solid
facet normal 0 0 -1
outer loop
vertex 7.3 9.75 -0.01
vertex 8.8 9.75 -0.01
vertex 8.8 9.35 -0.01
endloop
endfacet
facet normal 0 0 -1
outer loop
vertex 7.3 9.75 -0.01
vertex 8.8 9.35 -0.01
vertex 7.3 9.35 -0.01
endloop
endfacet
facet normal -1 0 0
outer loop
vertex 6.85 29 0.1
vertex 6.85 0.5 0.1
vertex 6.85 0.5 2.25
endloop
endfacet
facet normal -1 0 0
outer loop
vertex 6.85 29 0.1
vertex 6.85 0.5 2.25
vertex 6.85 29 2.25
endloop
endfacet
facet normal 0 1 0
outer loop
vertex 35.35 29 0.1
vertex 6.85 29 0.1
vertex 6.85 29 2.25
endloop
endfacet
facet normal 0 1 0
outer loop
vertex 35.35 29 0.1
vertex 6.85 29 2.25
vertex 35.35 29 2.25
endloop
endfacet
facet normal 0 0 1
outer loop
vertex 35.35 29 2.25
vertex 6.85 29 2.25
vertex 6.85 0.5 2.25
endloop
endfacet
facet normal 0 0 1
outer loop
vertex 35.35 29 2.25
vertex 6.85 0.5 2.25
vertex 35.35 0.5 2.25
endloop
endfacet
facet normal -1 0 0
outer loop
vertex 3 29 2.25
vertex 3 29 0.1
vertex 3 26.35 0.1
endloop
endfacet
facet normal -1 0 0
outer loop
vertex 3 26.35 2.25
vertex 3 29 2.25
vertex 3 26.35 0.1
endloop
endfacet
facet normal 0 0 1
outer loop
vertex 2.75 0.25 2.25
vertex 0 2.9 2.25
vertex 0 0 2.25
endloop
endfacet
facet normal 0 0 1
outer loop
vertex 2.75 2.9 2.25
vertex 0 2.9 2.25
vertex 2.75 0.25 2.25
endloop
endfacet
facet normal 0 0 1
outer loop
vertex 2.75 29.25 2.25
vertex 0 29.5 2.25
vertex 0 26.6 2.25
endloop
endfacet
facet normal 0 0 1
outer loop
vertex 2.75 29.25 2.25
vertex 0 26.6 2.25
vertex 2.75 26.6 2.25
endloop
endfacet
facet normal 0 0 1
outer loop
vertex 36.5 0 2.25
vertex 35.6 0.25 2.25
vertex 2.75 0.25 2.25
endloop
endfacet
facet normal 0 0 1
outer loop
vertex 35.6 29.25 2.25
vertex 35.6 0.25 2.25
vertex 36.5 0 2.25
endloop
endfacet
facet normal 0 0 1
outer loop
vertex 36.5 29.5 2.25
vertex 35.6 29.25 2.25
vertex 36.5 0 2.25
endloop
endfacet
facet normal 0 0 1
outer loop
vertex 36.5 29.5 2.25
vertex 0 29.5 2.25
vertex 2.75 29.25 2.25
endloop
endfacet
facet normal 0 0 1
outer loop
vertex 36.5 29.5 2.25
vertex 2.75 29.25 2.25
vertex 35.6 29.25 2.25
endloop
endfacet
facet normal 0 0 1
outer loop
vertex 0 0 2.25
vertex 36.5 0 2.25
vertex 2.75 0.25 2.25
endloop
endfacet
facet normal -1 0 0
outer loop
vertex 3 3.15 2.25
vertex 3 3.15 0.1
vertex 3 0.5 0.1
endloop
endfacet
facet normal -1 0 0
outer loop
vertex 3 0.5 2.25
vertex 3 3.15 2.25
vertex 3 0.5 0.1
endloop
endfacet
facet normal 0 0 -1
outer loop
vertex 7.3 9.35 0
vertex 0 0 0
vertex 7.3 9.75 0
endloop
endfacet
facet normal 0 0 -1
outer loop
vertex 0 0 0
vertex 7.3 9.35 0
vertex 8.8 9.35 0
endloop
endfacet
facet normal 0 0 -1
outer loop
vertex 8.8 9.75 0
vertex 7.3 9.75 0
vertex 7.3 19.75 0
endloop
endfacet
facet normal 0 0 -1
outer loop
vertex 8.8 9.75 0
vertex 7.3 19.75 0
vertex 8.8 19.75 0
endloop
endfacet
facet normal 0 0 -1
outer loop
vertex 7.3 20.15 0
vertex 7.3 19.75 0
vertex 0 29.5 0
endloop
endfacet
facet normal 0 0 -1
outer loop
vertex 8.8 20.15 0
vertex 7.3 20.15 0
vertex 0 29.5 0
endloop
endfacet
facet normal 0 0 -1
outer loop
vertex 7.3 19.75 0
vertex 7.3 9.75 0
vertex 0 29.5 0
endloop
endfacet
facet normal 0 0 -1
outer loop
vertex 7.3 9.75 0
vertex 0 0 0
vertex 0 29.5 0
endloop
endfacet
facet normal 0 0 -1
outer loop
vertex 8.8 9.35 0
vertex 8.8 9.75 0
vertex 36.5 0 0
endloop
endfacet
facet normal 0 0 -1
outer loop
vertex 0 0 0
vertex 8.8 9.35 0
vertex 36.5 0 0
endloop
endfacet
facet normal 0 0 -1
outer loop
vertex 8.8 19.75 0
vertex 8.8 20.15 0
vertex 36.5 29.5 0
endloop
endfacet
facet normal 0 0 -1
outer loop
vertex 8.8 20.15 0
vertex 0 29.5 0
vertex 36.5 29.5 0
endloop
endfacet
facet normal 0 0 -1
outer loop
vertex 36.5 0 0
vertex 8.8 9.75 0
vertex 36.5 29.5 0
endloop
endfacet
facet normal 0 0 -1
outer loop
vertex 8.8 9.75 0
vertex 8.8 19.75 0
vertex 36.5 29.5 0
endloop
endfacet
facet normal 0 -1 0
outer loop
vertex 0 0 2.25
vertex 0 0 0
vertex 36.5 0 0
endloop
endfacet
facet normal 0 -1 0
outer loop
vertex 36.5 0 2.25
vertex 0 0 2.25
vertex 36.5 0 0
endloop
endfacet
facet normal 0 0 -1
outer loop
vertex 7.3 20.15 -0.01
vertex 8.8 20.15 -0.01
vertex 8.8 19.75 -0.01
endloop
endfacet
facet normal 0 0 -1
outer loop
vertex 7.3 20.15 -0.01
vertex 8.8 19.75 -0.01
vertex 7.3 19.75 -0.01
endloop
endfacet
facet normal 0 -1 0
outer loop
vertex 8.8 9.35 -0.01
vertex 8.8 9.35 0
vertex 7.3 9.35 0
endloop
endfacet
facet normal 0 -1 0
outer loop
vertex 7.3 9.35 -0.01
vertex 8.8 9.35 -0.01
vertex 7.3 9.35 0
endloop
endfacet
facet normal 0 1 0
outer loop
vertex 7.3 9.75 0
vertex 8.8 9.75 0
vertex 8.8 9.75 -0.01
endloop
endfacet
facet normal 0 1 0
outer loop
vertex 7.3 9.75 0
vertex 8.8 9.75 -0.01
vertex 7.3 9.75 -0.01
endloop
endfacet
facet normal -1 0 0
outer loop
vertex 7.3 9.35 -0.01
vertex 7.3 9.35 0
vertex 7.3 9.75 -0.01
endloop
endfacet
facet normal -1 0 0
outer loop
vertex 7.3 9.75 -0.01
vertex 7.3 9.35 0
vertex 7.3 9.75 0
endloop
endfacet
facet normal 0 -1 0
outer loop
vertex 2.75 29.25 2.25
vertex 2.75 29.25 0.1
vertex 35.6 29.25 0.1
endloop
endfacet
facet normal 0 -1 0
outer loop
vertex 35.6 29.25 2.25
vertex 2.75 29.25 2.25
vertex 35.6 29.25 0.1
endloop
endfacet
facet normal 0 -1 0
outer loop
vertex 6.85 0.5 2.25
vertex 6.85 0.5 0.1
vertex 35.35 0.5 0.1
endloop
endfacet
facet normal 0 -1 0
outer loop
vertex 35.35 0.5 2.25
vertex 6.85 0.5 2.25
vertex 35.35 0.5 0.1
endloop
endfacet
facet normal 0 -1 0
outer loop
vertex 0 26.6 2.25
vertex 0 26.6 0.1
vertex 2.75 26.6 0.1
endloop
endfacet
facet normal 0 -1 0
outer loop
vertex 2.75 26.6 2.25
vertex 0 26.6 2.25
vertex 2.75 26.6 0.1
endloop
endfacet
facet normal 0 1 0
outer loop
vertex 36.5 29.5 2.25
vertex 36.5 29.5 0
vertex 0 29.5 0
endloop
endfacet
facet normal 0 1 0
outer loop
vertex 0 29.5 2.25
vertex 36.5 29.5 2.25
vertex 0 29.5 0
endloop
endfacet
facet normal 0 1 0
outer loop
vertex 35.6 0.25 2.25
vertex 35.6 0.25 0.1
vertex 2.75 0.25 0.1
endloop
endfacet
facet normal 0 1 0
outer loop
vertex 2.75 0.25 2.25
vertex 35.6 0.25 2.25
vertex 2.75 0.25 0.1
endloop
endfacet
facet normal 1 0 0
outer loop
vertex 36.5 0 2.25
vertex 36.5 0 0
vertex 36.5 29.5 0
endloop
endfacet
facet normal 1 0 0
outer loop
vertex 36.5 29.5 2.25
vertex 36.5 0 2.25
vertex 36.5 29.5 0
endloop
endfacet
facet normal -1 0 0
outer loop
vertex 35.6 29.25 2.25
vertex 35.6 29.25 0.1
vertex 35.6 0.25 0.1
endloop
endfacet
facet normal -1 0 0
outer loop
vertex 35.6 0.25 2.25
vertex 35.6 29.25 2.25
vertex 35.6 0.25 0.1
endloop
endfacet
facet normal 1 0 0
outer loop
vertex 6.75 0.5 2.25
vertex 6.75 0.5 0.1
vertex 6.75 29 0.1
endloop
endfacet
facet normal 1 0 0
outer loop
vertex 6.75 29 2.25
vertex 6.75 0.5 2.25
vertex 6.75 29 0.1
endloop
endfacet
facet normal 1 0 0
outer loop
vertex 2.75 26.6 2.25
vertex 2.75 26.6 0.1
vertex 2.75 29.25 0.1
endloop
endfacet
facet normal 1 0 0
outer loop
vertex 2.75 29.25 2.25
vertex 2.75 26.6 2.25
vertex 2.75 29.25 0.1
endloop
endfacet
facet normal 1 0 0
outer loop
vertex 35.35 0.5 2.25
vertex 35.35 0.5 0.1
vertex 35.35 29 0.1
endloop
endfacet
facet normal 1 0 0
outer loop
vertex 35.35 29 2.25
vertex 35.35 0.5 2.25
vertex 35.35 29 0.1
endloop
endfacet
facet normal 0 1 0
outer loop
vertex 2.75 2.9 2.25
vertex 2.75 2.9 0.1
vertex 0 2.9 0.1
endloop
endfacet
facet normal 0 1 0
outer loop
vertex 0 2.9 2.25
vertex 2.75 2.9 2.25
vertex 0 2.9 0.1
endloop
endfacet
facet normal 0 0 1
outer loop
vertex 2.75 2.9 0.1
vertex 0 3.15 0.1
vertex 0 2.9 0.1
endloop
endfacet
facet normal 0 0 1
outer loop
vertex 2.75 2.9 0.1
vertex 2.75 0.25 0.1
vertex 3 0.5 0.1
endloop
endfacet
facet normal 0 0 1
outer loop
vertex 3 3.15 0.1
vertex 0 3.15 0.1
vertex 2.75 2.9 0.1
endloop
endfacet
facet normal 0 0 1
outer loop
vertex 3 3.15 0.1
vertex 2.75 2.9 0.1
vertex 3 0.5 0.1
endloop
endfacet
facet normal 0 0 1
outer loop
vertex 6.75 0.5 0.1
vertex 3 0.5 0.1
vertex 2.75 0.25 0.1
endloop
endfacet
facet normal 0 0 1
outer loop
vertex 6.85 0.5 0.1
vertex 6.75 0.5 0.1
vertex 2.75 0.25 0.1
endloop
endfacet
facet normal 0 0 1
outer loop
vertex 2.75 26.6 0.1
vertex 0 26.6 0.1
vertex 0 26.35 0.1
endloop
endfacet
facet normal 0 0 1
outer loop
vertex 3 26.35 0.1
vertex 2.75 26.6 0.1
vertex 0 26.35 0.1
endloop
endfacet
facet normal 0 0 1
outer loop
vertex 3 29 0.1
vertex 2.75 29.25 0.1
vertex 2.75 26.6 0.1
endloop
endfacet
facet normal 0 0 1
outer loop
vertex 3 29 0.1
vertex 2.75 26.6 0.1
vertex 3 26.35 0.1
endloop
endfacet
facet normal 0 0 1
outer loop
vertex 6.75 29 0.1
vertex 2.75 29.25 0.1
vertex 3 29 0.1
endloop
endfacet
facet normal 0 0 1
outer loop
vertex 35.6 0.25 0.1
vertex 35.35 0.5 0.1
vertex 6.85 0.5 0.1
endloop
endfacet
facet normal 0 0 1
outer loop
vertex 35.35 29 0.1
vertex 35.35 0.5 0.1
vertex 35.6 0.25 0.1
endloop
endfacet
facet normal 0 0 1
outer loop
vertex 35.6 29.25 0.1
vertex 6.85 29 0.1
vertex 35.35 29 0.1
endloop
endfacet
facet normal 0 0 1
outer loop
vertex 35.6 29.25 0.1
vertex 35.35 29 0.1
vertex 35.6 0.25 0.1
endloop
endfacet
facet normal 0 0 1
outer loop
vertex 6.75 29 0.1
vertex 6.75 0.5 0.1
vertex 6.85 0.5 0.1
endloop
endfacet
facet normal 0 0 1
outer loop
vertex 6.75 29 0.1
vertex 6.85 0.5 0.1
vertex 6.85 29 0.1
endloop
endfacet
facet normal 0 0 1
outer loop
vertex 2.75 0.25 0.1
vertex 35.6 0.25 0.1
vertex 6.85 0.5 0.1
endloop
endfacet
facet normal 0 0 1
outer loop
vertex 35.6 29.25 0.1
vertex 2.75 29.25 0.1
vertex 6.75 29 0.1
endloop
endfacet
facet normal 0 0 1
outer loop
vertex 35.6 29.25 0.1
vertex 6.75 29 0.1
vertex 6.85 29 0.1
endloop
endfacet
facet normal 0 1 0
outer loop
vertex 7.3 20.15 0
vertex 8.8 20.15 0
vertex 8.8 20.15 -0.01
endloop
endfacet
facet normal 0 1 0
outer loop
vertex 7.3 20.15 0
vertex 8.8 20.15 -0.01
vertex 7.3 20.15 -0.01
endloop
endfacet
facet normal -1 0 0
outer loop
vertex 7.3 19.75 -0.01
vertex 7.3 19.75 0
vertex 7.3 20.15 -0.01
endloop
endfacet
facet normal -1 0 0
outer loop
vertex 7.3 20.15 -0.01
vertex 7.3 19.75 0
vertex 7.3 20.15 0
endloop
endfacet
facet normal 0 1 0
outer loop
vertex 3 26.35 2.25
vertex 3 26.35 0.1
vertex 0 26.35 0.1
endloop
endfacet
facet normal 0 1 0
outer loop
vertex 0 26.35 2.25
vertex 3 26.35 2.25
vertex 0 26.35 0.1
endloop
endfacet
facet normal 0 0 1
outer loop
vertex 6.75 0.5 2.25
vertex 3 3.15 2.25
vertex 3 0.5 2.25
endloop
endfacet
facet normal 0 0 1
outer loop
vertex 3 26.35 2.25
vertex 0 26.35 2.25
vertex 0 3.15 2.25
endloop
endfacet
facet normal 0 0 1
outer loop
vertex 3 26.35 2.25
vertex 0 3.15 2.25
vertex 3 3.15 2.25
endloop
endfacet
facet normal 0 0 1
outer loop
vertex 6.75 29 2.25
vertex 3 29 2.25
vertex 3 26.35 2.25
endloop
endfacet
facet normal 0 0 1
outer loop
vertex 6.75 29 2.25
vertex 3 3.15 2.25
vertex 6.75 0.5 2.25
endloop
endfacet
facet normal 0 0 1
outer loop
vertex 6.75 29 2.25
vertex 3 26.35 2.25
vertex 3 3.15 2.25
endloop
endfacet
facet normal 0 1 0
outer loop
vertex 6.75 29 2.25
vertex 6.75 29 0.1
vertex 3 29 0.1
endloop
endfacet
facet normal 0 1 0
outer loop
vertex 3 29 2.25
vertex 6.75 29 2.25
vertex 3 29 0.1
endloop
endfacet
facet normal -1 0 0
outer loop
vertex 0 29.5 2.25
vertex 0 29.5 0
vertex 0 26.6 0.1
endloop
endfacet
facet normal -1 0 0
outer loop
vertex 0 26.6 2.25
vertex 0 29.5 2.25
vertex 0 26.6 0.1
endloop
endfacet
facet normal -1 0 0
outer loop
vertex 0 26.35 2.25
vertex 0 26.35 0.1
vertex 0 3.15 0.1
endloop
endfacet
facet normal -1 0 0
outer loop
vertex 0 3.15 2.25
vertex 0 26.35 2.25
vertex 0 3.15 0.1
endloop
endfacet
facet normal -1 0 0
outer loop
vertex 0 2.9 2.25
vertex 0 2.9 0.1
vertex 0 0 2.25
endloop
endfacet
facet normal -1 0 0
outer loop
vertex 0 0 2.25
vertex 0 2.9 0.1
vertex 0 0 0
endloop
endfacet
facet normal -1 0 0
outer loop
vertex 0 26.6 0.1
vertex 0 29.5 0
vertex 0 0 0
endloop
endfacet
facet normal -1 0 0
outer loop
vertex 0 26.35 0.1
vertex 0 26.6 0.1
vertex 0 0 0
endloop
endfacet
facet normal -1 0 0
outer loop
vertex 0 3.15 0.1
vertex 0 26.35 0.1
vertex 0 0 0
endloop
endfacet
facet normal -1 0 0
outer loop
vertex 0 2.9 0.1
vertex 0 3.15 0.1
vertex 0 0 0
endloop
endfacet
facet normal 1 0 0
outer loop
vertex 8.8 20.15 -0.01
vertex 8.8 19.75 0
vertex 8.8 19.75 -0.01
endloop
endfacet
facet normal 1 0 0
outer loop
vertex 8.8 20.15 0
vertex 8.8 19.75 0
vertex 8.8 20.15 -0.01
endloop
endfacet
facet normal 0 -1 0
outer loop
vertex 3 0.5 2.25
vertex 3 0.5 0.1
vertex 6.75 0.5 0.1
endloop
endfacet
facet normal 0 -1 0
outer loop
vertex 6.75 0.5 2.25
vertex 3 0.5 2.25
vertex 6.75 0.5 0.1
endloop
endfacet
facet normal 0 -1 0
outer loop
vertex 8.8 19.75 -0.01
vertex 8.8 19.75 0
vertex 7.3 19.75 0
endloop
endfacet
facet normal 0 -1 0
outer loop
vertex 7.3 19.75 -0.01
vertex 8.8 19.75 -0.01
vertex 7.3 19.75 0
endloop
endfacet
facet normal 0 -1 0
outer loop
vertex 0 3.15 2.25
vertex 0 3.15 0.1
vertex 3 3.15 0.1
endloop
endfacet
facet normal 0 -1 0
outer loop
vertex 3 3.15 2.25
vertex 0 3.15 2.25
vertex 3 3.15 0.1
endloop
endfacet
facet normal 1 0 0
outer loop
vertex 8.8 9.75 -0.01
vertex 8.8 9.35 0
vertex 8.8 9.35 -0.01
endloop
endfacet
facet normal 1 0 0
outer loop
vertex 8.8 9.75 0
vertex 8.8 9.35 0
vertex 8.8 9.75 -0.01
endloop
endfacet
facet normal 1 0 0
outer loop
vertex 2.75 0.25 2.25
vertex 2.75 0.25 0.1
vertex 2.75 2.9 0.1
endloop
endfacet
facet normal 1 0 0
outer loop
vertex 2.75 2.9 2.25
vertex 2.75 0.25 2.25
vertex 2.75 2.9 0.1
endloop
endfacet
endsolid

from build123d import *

# Parameters (mm, degrees)
EXTRUDE_938_DEPTH  = 2.25
EXTRUDE_987_DEPTH  = 0.1
SKETCH_1488_W      = 28.5
SKETCH_1488_H      = 28.5
EXTRUDE_2115_DEPTH = 2.15
SKETCH_2253_W      = 1.5
SKETCH_2253_H      = 0.4
EXTRUDE_2914_DEPTH = 0.01


with BuildPart() as part:
    # Sketch 282 → Extrude 938 (new body)
    with BuildSketch(Plane.XY):
        Polygon((36.5, 29.5), (0, 29.5), (0, 26.6), (2.75, 26.6), (2.75, 29.25), (35.6, 29.25), (35.6, 0.25), (2.75, 0.25), (2.75, 2.9), (0, 2.9), (0, 0), (36.5, 0), align=None)
    extrude(amount=EXTRUDE_938_DEPTH)

    # 底面草图<3> → Extrude 987 (add)
    with BuildSketch(Plane.XY):
        Polygon((2.75, 26.6), (0, 26.6), (0, 2.9), (2.75, 2.9), (2.75, 0.25), (35.6, 0.25), (35.6, 29.25), (2.75, 29.25), align=None)
    extrude(amount=EXTRUDE_987_DEPTH)

    # Sketch 1488 → Extrude 2115 (add)
    with BuildSketch(Plane.XY.offset(0.1)):
        with Locations((21.1, 14.75)):
            Rectangle(SKETCH_1488_W, SKETCH_1488_H)
        Polygon((6.75, 0.5), (6.75, 29), (3, 29), (3, 26.35), (0, 26.35), (0, 3.15), (3, 3.15), (3, 0.5), align=None)
    extrude(amount=EXTRUDE_2115_DEPTH)

    # Sketch 2253 → Extrude 2914 (add)
    with BuildSketch(Plane(origin=(0, 0, 0), x_dir=(-1, 0, 0), z_dir=(0, 0, -1))):
        with Locations((-8.05, 9.55)):
            Rectangle(SKETCH_2253_W, SKETCH_2253_H)
        with Locations((-8.05, 19.95)):
            Rectangle(SKETCH_2253_W, SKETCH_2253_H)
    extrude(amount=EXTRUDE_2914_DEPTH)


solid = part.part
